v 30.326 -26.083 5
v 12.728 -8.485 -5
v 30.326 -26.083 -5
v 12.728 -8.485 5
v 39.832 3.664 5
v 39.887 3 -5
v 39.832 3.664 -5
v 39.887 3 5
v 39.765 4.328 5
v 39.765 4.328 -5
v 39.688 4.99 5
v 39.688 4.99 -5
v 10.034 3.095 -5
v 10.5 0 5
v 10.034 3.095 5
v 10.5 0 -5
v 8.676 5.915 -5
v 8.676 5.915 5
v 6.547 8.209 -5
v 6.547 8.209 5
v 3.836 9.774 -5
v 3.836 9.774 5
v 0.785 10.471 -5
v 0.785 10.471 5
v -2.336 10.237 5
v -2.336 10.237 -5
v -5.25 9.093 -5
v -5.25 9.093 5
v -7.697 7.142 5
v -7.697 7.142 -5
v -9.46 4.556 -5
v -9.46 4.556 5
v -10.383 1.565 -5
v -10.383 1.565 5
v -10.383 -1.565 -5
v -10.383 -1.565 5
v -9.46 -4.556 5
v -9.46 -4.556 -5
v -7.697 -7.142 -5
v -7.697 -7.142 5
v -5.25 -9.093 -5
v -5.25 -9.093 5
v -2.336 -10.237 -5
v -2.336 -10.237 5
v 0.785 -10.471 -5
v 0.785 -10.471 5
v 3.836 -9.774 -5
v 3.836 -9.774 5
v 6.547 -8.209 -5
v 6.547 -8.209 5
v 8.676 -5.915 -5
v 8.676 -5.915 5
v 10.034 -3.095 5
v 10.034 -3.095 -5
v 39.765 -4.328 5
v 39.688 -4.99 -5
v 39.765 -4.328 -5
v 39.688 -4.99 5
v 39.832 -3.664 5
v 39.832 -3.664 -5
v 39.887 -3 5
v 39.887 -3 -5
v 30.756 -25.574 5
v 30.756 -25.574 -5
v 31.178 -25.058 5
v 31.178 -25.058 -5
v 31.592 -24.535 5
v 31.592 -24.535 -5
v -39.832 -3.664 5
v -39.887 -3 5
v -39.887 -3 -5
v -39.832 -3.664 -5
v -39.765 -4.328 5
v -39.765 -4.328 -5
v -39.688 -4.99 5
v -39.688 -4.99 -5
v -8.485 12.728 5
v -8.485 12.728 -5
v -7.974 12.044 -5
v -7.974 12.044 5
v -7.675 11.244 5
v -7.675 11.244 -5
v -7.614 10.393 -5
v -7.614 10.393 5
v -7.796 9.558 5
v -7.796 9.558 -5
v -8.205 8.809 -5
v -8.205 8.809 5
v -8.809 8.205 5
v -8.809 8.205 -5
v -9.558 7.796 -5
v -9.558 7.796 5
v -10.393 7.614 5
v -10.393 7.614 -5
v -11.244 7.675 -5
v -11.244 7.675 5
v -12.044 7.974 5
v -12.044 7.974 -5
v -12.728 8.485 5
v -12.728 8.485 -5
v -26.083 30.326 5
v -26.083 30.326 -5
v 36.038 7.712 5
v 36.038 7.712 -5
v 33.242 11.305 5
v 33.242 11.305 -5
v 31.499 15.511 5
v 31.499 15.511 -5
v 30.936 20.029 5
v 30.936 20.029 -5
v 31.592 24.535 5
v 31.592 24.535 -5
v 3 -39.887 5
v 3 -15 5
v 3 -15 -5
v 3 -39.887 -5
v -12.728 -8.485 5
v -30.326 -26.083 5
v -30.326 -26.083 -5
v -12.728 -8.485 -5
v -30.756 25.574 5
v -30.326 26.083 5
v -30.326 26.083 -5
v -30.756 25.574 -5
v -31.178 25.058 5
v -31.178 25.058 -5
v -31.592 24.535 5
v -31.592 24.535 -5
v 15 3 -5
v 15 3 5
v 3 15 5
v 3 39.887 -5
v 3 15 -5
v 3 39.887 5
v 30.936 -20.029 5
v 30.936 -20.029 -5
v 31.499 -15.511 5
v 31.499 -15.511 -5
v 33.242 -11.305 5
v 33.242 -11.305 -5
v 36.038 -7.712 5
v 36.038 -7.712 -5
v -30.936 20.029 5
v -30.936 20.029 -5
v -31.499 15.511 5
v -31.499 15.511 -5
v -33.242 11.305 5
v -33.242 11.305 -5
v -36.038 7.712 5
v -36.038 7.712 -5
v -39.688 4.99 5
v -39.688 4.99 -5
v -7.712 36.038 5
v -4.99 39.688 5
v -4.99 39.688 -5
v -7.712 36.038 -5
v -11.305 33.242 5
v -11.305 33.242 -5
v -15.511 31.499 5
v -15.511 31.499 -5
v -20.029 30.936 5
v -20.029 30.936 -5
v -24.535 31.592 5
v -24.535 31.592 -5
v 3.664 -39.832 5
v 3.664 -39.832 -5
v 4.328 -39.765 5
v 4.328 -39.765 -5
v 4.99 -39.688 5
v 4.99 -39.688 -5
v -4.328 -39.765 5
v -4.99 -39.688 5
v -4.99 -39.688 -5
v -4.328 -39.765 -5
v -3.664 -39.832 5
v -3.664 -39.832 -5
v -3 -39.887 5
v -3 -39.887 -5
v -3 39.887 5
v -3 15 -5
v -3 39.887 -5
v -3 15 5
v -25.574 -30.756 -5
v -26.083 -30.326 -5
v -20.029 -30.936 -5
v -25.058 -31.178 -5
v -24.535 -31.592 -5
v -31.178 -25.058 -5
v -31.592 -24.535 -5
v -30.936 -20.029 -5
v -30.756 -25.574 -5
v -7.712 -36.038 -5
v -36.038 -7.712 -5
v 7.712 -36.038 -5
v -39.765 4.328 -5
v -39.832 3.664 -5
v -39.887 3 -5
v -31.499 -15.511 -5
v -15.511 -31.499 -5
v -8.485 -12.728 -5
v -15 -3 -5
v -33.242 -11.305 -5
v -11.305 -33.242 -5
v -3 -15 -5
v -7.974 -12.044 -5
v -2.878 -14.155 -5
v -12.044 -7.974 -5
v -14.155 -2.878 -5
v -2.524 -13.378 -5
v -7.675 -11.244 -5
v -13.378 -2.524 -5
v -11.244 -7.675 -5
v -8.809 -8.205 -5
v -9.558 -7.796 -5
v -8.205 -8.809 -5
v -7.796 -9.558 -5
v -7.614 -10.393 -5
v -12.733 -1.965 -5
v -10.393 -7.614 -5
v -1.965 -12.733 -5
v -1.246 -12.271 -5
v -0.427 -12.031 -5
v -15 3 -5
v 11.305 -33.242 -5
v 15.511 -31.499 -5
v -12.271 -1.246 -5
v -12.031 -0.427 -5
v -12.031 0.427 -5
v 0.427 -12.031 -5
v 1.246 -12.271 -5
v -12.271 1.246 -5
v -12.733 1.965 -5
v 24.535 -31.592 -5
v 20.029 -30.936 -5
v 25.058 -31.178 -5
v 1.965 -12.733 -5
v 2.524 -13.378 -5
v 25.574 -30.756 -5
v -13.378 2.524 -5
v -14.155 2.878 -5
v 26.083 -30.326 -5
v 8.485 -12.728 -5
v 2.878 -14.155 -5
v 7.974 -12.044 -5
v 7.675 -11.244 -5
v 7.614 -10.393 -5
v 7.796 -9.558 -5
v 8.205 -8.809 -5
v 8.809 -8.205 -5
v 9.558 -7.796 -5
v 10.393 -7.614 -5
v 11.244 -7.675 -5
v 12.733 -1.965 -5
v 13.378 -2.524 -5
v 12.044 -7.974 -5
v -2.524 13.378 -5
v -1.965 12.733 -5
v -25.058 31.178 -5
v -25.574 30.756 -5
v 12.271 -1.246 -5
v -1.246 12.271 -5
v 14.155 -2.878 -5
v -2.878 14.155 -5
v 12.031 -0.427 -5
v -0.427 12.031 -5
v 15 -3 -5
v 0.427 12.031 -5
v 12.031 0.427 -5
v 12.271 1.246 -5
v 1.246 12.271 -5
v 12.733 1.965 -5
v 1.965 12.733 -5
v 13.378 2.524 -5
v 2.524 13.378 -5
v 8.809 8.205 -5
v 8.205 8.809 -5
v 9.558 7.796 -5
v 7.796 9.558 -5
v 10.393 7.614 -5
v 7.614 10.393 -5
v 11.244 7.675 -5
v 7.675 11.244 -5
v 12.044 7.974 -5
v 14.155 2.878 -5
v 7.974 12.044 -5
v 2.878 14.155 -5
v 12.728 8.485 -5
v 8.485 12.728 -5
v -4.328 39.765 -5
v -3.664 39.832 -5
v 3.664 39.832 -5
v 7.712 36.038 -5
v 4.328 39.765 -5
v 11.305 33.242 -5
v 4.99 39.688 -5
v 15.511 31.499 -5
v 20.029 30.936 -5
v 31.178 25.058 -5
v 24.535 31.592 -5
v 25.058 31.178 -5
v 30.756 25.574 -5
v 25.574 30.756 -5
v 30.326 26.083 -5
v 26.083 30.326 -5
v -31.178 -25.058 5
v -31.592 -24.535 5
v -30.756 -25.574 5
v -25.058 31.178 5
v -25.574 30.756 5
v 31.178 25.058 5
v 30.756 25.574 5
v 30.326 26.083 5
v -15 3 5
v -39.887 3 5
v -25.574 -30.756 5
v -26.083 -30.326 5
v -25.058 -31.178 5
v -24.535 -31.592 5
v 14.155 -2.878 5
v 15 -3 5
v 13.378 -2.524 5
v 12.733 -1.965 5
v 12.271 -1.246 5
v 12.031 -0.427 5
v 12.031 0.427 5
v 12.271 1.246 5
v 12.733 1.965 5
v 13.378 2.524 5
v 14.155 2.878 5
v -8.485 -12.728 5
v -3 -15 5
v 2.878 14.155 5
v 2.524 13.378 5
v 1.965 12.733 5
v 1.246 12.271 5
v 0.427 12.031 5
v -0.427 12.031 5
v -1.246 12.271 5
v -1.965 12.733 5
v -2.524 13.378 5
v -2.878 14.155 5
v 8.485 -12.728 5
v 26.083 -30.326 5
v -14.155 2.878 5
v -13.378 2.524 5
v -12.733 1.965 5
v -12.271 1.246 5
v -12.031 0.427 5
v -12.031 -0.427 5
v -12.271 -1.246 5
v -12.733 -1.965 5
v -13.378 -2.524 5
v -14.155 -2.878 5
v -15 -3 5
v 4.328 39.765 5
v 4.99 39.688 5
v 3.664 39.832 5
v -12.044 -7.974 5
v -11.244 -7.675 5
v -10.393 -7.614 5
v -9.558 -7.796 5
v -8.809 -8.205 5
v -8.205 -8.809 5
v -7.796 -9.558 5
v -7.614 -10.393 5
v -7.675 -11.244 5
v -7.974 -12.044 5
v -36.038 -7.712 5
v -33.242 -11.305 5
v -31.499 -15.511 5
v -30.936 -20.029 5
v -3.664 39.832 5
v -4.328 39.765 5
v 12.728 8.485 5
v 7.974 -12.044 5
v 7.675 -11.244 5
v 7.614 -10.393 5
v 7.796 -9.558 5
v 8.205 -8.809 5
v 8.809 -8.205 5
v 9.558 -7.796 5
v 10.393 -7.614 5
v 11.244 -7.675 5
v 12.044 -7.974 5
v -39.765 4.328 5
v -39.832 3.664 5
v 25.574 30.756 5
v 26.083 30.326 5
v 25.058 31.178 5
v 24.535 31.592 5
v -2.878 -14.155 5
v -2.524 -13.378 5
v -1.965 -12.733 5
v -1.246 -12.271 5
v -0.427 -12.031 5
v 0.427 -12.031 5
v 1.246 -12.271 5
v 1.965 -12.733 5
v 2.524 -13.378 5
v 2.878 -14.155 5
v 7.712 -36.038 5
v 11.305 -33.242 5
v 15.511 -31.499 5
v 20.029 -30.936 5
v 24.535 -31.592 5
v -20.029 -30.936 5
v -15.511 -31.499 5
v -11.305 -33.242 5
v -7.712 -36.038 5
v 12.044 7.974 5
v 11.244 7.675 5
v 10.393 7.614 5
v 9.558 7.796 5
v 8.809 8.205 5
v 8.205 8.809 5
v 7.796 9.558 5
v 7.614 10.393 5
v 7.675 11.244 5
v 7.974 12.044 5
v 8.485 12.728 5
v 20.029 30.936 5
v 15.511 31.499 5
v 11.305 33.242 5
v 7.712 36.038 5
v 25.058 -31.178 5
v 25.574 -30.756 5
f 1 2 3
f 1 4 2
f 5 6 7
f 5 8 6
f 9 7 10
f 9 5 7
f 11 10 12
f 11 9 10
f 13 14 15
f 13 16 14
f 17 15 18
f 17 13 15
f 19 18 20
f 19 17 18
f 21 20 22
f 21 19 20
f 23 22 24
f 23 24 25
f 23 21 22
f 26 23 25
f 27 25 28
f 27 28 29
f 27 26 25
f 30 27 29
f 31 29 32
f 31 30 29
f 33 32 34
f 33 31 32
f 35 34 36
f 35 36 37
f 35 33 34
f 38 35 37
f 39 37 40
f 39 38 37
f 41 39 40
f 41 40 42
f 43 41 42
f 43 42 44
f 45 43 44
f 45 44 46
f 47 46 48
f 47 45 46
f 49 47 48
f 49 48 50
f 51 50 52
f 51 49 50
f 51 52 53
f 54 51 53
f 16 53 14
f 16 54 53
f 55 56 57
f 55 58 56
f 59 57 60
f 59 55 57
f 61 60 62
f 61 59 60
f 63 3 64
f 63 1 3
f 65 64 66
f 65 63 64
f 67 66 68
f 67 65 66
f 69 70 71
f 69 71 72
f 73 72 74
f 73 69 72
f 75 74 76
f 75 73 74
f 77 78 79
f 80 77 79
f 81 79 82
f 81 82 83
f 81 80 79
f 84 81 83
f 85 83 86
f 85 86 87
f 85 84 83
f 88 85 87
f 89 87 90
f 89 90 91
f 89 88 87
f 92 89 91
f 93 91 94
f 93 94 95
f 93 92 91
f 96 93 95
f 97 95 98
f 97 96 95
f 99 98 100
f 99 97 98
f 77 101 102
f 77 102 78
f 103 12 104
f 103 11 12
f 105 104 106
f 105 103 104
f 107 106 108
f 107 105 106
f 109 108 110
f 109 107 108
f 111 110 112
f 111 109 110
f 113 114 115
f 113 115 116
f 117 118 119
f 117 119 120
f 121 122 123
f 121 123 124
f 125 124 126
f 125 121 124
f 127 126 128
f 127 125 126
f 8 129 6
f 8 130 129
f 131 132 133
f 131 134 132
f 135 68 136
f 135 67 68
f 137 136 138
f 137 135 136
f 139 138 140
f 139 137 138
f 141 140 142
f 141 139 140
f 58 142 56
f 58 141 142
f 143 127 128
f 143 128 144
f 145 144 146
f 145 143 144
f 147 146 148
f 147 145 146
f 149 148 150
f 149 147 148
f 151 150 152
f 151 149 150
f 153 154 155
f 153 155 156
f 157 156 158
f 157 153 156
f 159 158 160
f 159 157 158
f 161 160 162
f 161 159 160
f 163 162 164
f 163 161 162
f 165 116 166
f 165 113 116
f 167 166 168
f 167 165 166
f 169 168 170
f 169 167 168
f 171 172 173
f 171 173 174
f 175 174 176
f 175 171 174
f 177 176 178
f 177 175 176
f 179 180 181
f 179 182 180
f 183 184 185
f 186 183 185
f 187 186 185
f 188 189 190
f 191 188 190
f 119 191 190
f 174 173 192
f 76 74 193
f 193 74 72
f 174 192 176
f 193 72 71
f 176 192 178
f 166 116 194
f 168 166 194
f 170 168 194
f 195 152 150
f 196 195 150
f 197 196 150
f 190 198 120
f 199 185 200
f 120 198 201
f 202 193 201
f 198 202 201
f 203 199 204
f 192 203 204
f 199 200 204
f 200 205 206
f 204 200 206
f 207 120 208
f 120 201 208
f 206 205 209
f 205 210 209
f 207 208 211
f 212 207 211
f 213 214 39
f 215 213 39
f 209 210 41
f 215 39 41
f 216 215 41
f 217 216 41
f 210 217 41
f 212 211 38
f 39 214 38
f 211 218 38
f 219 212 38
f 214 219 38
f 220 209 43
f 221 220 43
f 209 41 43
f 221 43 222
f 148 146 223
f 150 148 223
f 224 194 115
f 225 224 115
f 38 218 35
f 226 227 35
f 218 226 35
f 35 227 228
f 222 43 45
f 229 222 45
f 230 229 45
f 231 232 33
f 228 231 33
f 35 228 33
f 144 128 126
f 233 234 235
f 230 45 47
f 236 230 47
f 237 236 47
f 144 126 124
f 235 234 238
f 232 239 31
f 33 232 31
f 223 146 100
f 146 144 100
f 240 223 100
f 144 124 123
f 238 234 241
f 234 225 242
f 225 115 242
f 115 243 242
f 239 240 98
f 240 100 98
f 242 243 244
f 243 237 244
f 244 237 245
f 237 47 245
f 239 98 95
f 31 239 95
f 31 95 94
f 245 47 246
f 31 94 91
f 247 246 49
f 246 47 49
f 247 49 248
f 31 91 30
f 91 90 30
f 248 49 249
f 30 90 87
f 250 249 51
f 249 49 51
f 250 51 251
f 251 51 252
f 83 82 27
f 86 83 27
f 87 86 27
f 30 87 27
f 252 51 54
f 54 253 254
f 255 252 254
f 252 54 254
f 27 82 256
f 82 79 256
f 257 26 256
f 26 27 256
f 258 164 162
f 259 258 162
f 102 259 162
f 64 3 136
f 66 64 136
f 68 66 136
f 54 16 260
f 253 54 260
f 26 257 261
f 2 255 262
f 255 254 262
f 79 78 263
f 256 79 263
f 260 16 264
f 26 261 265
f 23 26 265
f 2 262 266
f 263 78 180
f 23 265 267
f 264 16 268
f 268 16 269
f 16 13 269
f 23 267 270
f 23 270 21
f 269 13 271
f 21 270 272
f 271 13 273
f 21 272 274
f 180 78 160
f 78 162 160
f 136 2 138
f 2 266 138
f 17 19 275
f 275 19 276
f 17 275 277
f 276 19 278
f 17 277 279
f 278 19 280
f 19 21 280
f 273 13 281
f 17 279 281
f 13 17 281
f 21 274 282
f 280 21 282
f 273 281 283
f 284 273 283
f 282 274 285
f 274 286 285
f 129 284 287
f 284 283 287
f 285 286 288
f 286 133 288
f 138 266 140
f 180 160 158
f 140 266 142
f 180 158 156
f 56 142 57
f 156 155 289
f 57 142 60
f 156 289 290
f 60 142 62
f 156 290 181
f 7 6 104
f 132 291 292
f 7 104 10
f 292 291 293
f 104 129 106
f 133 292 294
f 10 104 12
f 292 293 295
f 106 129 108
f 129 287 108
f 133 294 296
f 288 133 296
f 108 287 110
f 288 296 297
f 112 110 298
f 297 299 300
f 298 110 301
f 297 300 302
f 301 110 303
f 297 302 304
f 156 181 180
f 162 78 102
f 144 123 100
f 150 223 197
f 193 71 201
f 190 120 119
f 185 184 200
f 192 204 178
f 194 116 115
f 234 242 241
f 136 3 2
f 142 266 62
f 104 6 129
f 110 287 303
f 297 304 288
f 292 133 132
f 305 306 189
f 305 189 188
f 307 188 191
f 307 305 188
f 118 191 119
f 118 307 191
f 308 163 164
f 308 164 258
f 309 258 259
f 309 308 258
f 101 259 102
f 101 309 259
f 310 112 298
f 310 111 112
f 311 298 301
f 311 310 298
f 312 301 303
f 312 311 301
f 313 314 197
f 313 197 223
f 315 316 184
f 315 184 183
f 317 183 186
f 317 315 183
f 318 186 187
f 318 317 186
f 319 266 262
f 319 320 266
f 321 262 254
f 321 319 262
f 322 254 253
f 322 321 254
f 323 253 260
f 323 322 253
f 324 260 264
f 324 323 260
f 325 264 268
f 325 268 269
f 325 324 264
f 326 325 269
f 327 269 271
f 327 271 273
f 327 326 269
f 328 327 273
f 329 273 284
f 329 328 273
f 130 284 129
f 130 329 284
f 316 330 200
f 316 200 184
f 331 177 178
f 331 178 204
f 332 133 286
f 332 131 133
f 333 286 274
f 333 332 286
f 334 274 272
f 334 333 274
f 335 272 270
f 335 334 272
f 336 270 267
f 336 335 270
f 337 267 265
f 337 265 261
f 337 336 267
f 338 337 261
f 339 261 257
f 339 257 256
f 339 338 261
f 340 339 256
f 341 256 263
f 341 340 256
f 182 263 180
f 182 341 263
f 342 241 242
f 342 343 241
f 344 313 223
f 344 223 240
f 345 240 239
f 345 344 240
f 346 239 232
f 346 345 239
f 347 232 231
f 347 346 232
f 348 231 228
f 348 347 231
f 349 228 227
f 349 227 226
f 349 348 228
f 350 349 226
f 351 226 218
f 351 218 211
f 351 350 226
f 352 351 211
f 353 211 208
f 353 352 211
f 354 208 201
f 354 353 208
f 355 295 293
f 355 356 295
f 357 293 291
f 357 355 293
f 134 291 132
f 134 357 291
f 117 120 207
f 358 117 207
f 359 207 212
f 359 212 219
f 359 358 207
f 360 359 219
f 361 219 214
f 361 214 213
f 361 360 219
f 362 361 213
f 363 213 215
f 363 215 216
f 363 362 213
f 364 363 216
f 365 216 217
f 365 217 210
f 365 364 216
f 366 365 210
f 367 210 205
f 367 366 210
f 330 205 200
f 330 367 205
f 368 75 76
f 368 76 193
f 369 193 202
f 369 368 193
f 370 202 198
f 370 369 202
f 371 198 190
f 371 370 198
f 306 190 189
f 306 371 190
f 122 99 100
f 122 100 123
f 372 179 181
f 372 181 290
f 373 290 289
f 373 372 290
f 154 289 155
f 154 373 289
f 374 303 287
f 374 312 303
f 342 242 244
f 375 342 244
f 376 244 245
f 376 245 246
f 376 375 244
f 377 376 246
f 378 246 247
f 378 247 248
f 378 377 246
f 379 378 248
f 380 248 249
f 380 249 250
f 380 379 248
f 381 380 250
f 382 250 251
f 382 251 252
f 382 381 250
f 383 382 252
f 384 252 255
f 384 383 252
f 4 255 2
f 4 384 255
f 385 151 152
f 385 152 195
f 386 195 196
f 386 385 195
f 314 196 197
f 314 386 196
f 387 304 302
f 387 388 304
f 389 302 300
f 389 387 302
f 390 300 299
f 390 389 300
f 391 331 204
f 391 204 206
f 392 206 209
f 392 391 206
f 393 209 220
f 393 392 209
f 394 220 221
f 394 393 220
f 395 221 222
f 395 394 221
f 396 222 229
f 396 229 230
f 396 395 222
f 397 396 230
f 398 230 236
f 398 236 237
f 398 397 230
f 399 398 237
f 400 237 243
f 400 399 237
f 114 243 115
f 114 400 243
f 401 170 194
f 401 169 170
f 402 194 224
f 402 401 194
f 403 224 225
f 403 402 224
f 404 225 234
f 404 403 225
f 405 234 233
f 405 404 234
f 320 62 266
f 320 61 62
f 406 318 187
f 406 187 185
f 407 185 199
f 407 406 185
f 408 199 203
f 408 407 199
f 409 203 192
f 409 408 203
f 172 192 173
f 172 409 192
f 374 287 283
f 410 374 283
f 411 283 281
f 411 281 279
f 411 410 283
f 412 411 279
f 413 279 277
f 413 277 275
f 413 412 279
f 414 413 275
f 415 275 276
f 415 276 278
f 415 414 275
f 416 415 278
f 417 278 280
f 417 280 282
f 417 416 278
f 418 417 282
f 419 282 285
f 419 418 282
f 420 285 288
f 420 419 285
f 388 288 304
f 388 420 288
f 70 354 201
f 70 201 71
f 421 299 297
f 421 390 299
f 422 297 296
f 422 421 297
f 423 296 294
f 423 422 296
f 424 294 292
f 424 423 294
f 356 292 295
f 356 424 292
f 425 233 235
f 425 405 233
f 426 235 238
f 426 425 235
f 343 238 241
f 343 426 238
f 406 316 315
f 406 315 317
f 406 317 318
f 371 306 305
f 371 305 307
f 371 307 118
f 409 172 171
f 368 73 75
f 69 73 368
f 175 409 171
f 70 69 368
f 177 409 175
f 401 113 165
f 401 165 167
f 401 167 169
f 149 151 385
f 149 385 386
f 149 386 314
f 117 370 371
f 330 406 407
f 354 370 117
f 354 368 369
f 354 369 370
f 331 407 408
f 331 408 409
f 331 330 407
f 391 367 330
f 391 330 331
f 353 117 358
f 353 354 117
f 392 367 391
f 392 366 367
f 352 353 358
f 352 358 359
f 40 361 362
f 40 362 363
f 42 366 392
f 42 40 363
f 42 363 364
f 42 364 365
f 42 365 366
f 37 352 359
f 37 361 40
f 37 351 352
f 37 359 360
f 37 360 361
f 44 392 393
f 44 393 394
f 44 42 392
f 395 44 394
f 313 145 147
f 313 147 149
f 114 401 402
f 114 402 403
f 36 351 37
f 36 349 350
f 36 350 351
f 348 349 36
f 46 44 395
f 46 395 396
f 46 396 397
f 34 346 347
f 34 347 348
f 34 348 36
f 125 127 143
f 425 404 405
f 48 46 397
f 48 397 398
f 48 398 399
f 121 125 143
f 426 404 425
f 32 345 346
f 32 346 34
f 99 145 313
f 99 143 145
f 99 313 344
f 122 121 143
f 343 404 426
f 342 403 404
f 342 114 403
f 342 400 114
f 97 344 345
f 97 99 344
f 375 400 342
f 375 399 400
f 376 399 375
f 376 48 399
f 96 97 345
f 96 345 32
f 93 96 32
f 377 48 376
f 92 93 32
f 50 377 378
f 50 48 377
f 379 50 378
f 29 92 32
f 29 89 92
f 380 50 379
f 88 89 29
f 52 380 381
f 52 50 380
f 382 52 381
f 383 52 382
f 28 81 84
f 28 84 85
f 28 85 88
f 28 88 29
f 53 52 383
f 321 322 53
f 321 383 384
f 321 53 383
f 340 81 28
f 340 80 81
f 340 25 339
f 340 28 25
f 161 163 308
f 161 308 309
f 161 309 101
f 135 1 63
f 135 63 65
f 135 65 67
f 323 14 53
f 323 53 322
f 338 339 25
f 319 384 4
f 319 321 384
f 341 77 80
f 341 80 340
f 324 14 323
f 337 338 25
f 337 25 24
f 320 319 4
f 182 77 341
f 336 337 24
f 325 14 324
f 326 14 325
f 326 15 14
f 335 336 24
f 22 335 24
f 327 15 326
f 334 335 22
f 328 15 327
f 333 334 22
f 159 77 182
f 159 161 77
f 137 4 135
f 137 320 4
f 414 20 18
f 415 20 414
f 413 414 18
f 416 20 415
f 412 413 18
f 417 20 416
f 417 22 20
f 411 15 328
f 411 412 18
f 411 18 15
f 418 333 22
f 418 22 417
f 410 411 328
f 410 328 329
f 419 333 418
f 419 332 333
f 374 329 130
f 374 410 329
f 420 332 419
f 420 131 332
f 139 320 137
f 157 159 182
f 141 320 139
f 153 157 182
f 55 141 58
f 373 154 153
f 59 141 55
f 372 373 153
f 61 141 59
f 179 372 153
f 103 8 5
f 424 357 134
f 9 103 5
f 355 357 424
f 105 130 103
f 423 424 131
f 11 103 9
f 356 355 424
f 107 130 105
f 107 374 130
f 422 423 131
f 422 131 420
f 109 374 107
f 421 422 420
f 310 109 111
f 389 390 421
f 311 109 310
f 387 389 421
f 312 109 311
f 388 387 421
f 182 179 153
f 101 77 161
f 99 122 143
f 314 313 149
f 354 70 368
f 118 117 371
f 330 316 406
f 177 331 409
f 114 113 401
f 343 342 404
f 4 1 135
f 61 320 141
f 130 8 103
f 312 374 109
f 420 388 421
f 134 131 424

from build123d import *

# Parameters (mm, degrees)
SKETCH1_R           = 10.5
BOSS_EXTRUDE1_DEPTH = 5


with BuildPart() as part:
    # Sketch1 → Boss-Extrude1 (new, symmetric)
    with BuildSketch(Plane.XY):
        with BuildLine():
            Line((-3, 15), (-3, 39.88734135))
            ThreePointArc((-3, 39.88734135), (-3.996245887, 39.799874608), (-4.98999373, 39.687529056))
            ThreePointArc((-4.98999373, 39.687529056), (-13.349724383, 32.229085659), (-24.534862519, 31.591779329))
            ThreePointArc((-24.534862519, 31.591779329), (-25.31698866, 30.968533792), (-26.083289209, 30.325929896))
            Line((-26.083289209, 30.325929896), (-8.485281374, 12.727922061))
            ThreePointArc((-8.485281374, 12.727922061), (-8.485281374, 8.485281374), (-12.727922061, 8.485281374))
            Line((-12.727922061, 8.485281374), (-30.325929896, 26.083289209))
            ThreePointArc((-30.325929896, 26.083289209), (-30.968533792, 25.31698866), (-31.591779329, 24.534862519))
            ThreePointArc((-31.591779329, 24.534862519), (-32.229085659, 13.349724383), (-39.687529056, 4.98999373))
            ThreePointArc((-39.687529056, 4.98999373), (-39.799874608, 3.996245887), (-39.88734135, 3))
            Line((-39.88734135, 3), (-15, 3))
            ThreePointArc((-15, 3), (-12, 0), (-15, -3))
            Line((-15, -3), (-39.88734135, -3))
            ThreePointArc((-39.88734135, -3), (-39.799874608, -3.996245887), (-39.687529056, -4.98999373))
            ThreePointArc((-39.687529056, -4.98999373), (-32.229085659, -13.349724383), (-31.591779329, -24.534862519))
            ThreePointArc((-31.591779329, -24.534862519), (-30.968533792, -25.31698866), (-30.325929896, -26.083289209))
            Line((-30.325929896, -26.083289209), (-12.727922061, -8.485281374))
            ThreePointArc((-12.727922061, -8.485281374), (-8.485281374, -8.485281374), (-8.485281374, -12.727922061))
            Line((-8.485281374, -12.727922061), (-26.083289209, -30.325929896))
            ThreePointArc((-26.083289209, -30.325929896), (-25.31698866, -30.968533792), (-24.534862519, -31.591779329))
            ThreePointArc((-24.534862519, -31.591779329), (-13.349724383, -32.229085659), (-4.98999373, -39.687529056))
            ThreePointArc((-4.98999373, -39.687529056), (-3.996245887, -39.799874608), (-3, -39.88734135))
            Line((-3, -39.88734135), (-3, -15))
            ThreePointArc((-3, -15), (0, -12), (3, -15))
            Line((3, -15), (3, -39.88734135))
            ThreePointArc((3, -39.88734135), (3.996245887, -39.799874608), (4.98999373, -39.687529056))
            ThreePointArc((4.98999373, -39.687529056), (13.349724383, -32.229085659), (24.534862519, -31.591779329))
            ThreePointArc((24.534862519, -31.591779329), (25.31698866, -30.968533792), (26.083289209, -30.325929896))
            Line((26.083289209, -30.325929896), (8.485281374, -12.727922061))
            ThreePointArc((8.485281374, -12.727922061), (8.485281374, -8.485281374), (12.727922061, -8.485281374))
            Line((12.727922061, -8.485281374), (30.325929896, -26.083289209))
            ThreePointArc((30.325929896, -26.083289209), (30.968533792, -25.31698866), (31.591779329, -24.534862519))
            ThreePointArc((31.591779329, -24.534862519), (32.229085659, -13.349724383), (39.687529056, -4.98999373))
            ThreePointArc((39.687529056, -4.98999373), (39.799874608, -3.996245887), (39.88734135, -3))
            Line((39.88734135, -3), (15, -3))
            ThreePointArc((15, -3), (12, 0), (15, 3))
            Line((15, 3), (39.88734135, 3))
            ThreePointArc((39.88734135, 3), (39.799874608, 3.996245887), (39.687529056, 4.98999373))
            ThreePointArc((39.687529056, 4.98999373), (32.229085659, 13.349724383), (31.591779329, 24.534862519))
            ThreePointArc((31.591779329, 24.534862519), (30.968533792, 25.31698866), (30.325929896, 26.083289209))
            Line((30.325929896, 26.083289209), (12.727922061, 8.485281374))
            ThreePointArc((12.727922061, 8.485281374), (8.485281374, 8.485281374), (8.485281374, 12.727922061))
            Line((8.485281374, 12.727922061), (26.083289209, 30.325929896))
            ThreePointArc((26.083289209, 30.325929896), (25.31698866, 30.968533792), (24.534862519, 31.591779329))
            ThreePointArc((24.534862519, 31.591779329), (13.349724383, 32.229085659), (4.98999373, 39.687529056))
            ThreePointArc((4.98999373, 39.687529056), (3.996245887, 39.799874608), (3, 39.88734135))
            Line((3, 39.88734135), (3, 15))
            ThreePointArc((3, 15), (0, 12), (-3, 15))
        make_face()
        Circle(SKETCH1_R, mode=Mode.SUBTRACT)
    extrude(amount=BOSS_EXTRUDE1_DEPTH, both=True)


solid = part.part
